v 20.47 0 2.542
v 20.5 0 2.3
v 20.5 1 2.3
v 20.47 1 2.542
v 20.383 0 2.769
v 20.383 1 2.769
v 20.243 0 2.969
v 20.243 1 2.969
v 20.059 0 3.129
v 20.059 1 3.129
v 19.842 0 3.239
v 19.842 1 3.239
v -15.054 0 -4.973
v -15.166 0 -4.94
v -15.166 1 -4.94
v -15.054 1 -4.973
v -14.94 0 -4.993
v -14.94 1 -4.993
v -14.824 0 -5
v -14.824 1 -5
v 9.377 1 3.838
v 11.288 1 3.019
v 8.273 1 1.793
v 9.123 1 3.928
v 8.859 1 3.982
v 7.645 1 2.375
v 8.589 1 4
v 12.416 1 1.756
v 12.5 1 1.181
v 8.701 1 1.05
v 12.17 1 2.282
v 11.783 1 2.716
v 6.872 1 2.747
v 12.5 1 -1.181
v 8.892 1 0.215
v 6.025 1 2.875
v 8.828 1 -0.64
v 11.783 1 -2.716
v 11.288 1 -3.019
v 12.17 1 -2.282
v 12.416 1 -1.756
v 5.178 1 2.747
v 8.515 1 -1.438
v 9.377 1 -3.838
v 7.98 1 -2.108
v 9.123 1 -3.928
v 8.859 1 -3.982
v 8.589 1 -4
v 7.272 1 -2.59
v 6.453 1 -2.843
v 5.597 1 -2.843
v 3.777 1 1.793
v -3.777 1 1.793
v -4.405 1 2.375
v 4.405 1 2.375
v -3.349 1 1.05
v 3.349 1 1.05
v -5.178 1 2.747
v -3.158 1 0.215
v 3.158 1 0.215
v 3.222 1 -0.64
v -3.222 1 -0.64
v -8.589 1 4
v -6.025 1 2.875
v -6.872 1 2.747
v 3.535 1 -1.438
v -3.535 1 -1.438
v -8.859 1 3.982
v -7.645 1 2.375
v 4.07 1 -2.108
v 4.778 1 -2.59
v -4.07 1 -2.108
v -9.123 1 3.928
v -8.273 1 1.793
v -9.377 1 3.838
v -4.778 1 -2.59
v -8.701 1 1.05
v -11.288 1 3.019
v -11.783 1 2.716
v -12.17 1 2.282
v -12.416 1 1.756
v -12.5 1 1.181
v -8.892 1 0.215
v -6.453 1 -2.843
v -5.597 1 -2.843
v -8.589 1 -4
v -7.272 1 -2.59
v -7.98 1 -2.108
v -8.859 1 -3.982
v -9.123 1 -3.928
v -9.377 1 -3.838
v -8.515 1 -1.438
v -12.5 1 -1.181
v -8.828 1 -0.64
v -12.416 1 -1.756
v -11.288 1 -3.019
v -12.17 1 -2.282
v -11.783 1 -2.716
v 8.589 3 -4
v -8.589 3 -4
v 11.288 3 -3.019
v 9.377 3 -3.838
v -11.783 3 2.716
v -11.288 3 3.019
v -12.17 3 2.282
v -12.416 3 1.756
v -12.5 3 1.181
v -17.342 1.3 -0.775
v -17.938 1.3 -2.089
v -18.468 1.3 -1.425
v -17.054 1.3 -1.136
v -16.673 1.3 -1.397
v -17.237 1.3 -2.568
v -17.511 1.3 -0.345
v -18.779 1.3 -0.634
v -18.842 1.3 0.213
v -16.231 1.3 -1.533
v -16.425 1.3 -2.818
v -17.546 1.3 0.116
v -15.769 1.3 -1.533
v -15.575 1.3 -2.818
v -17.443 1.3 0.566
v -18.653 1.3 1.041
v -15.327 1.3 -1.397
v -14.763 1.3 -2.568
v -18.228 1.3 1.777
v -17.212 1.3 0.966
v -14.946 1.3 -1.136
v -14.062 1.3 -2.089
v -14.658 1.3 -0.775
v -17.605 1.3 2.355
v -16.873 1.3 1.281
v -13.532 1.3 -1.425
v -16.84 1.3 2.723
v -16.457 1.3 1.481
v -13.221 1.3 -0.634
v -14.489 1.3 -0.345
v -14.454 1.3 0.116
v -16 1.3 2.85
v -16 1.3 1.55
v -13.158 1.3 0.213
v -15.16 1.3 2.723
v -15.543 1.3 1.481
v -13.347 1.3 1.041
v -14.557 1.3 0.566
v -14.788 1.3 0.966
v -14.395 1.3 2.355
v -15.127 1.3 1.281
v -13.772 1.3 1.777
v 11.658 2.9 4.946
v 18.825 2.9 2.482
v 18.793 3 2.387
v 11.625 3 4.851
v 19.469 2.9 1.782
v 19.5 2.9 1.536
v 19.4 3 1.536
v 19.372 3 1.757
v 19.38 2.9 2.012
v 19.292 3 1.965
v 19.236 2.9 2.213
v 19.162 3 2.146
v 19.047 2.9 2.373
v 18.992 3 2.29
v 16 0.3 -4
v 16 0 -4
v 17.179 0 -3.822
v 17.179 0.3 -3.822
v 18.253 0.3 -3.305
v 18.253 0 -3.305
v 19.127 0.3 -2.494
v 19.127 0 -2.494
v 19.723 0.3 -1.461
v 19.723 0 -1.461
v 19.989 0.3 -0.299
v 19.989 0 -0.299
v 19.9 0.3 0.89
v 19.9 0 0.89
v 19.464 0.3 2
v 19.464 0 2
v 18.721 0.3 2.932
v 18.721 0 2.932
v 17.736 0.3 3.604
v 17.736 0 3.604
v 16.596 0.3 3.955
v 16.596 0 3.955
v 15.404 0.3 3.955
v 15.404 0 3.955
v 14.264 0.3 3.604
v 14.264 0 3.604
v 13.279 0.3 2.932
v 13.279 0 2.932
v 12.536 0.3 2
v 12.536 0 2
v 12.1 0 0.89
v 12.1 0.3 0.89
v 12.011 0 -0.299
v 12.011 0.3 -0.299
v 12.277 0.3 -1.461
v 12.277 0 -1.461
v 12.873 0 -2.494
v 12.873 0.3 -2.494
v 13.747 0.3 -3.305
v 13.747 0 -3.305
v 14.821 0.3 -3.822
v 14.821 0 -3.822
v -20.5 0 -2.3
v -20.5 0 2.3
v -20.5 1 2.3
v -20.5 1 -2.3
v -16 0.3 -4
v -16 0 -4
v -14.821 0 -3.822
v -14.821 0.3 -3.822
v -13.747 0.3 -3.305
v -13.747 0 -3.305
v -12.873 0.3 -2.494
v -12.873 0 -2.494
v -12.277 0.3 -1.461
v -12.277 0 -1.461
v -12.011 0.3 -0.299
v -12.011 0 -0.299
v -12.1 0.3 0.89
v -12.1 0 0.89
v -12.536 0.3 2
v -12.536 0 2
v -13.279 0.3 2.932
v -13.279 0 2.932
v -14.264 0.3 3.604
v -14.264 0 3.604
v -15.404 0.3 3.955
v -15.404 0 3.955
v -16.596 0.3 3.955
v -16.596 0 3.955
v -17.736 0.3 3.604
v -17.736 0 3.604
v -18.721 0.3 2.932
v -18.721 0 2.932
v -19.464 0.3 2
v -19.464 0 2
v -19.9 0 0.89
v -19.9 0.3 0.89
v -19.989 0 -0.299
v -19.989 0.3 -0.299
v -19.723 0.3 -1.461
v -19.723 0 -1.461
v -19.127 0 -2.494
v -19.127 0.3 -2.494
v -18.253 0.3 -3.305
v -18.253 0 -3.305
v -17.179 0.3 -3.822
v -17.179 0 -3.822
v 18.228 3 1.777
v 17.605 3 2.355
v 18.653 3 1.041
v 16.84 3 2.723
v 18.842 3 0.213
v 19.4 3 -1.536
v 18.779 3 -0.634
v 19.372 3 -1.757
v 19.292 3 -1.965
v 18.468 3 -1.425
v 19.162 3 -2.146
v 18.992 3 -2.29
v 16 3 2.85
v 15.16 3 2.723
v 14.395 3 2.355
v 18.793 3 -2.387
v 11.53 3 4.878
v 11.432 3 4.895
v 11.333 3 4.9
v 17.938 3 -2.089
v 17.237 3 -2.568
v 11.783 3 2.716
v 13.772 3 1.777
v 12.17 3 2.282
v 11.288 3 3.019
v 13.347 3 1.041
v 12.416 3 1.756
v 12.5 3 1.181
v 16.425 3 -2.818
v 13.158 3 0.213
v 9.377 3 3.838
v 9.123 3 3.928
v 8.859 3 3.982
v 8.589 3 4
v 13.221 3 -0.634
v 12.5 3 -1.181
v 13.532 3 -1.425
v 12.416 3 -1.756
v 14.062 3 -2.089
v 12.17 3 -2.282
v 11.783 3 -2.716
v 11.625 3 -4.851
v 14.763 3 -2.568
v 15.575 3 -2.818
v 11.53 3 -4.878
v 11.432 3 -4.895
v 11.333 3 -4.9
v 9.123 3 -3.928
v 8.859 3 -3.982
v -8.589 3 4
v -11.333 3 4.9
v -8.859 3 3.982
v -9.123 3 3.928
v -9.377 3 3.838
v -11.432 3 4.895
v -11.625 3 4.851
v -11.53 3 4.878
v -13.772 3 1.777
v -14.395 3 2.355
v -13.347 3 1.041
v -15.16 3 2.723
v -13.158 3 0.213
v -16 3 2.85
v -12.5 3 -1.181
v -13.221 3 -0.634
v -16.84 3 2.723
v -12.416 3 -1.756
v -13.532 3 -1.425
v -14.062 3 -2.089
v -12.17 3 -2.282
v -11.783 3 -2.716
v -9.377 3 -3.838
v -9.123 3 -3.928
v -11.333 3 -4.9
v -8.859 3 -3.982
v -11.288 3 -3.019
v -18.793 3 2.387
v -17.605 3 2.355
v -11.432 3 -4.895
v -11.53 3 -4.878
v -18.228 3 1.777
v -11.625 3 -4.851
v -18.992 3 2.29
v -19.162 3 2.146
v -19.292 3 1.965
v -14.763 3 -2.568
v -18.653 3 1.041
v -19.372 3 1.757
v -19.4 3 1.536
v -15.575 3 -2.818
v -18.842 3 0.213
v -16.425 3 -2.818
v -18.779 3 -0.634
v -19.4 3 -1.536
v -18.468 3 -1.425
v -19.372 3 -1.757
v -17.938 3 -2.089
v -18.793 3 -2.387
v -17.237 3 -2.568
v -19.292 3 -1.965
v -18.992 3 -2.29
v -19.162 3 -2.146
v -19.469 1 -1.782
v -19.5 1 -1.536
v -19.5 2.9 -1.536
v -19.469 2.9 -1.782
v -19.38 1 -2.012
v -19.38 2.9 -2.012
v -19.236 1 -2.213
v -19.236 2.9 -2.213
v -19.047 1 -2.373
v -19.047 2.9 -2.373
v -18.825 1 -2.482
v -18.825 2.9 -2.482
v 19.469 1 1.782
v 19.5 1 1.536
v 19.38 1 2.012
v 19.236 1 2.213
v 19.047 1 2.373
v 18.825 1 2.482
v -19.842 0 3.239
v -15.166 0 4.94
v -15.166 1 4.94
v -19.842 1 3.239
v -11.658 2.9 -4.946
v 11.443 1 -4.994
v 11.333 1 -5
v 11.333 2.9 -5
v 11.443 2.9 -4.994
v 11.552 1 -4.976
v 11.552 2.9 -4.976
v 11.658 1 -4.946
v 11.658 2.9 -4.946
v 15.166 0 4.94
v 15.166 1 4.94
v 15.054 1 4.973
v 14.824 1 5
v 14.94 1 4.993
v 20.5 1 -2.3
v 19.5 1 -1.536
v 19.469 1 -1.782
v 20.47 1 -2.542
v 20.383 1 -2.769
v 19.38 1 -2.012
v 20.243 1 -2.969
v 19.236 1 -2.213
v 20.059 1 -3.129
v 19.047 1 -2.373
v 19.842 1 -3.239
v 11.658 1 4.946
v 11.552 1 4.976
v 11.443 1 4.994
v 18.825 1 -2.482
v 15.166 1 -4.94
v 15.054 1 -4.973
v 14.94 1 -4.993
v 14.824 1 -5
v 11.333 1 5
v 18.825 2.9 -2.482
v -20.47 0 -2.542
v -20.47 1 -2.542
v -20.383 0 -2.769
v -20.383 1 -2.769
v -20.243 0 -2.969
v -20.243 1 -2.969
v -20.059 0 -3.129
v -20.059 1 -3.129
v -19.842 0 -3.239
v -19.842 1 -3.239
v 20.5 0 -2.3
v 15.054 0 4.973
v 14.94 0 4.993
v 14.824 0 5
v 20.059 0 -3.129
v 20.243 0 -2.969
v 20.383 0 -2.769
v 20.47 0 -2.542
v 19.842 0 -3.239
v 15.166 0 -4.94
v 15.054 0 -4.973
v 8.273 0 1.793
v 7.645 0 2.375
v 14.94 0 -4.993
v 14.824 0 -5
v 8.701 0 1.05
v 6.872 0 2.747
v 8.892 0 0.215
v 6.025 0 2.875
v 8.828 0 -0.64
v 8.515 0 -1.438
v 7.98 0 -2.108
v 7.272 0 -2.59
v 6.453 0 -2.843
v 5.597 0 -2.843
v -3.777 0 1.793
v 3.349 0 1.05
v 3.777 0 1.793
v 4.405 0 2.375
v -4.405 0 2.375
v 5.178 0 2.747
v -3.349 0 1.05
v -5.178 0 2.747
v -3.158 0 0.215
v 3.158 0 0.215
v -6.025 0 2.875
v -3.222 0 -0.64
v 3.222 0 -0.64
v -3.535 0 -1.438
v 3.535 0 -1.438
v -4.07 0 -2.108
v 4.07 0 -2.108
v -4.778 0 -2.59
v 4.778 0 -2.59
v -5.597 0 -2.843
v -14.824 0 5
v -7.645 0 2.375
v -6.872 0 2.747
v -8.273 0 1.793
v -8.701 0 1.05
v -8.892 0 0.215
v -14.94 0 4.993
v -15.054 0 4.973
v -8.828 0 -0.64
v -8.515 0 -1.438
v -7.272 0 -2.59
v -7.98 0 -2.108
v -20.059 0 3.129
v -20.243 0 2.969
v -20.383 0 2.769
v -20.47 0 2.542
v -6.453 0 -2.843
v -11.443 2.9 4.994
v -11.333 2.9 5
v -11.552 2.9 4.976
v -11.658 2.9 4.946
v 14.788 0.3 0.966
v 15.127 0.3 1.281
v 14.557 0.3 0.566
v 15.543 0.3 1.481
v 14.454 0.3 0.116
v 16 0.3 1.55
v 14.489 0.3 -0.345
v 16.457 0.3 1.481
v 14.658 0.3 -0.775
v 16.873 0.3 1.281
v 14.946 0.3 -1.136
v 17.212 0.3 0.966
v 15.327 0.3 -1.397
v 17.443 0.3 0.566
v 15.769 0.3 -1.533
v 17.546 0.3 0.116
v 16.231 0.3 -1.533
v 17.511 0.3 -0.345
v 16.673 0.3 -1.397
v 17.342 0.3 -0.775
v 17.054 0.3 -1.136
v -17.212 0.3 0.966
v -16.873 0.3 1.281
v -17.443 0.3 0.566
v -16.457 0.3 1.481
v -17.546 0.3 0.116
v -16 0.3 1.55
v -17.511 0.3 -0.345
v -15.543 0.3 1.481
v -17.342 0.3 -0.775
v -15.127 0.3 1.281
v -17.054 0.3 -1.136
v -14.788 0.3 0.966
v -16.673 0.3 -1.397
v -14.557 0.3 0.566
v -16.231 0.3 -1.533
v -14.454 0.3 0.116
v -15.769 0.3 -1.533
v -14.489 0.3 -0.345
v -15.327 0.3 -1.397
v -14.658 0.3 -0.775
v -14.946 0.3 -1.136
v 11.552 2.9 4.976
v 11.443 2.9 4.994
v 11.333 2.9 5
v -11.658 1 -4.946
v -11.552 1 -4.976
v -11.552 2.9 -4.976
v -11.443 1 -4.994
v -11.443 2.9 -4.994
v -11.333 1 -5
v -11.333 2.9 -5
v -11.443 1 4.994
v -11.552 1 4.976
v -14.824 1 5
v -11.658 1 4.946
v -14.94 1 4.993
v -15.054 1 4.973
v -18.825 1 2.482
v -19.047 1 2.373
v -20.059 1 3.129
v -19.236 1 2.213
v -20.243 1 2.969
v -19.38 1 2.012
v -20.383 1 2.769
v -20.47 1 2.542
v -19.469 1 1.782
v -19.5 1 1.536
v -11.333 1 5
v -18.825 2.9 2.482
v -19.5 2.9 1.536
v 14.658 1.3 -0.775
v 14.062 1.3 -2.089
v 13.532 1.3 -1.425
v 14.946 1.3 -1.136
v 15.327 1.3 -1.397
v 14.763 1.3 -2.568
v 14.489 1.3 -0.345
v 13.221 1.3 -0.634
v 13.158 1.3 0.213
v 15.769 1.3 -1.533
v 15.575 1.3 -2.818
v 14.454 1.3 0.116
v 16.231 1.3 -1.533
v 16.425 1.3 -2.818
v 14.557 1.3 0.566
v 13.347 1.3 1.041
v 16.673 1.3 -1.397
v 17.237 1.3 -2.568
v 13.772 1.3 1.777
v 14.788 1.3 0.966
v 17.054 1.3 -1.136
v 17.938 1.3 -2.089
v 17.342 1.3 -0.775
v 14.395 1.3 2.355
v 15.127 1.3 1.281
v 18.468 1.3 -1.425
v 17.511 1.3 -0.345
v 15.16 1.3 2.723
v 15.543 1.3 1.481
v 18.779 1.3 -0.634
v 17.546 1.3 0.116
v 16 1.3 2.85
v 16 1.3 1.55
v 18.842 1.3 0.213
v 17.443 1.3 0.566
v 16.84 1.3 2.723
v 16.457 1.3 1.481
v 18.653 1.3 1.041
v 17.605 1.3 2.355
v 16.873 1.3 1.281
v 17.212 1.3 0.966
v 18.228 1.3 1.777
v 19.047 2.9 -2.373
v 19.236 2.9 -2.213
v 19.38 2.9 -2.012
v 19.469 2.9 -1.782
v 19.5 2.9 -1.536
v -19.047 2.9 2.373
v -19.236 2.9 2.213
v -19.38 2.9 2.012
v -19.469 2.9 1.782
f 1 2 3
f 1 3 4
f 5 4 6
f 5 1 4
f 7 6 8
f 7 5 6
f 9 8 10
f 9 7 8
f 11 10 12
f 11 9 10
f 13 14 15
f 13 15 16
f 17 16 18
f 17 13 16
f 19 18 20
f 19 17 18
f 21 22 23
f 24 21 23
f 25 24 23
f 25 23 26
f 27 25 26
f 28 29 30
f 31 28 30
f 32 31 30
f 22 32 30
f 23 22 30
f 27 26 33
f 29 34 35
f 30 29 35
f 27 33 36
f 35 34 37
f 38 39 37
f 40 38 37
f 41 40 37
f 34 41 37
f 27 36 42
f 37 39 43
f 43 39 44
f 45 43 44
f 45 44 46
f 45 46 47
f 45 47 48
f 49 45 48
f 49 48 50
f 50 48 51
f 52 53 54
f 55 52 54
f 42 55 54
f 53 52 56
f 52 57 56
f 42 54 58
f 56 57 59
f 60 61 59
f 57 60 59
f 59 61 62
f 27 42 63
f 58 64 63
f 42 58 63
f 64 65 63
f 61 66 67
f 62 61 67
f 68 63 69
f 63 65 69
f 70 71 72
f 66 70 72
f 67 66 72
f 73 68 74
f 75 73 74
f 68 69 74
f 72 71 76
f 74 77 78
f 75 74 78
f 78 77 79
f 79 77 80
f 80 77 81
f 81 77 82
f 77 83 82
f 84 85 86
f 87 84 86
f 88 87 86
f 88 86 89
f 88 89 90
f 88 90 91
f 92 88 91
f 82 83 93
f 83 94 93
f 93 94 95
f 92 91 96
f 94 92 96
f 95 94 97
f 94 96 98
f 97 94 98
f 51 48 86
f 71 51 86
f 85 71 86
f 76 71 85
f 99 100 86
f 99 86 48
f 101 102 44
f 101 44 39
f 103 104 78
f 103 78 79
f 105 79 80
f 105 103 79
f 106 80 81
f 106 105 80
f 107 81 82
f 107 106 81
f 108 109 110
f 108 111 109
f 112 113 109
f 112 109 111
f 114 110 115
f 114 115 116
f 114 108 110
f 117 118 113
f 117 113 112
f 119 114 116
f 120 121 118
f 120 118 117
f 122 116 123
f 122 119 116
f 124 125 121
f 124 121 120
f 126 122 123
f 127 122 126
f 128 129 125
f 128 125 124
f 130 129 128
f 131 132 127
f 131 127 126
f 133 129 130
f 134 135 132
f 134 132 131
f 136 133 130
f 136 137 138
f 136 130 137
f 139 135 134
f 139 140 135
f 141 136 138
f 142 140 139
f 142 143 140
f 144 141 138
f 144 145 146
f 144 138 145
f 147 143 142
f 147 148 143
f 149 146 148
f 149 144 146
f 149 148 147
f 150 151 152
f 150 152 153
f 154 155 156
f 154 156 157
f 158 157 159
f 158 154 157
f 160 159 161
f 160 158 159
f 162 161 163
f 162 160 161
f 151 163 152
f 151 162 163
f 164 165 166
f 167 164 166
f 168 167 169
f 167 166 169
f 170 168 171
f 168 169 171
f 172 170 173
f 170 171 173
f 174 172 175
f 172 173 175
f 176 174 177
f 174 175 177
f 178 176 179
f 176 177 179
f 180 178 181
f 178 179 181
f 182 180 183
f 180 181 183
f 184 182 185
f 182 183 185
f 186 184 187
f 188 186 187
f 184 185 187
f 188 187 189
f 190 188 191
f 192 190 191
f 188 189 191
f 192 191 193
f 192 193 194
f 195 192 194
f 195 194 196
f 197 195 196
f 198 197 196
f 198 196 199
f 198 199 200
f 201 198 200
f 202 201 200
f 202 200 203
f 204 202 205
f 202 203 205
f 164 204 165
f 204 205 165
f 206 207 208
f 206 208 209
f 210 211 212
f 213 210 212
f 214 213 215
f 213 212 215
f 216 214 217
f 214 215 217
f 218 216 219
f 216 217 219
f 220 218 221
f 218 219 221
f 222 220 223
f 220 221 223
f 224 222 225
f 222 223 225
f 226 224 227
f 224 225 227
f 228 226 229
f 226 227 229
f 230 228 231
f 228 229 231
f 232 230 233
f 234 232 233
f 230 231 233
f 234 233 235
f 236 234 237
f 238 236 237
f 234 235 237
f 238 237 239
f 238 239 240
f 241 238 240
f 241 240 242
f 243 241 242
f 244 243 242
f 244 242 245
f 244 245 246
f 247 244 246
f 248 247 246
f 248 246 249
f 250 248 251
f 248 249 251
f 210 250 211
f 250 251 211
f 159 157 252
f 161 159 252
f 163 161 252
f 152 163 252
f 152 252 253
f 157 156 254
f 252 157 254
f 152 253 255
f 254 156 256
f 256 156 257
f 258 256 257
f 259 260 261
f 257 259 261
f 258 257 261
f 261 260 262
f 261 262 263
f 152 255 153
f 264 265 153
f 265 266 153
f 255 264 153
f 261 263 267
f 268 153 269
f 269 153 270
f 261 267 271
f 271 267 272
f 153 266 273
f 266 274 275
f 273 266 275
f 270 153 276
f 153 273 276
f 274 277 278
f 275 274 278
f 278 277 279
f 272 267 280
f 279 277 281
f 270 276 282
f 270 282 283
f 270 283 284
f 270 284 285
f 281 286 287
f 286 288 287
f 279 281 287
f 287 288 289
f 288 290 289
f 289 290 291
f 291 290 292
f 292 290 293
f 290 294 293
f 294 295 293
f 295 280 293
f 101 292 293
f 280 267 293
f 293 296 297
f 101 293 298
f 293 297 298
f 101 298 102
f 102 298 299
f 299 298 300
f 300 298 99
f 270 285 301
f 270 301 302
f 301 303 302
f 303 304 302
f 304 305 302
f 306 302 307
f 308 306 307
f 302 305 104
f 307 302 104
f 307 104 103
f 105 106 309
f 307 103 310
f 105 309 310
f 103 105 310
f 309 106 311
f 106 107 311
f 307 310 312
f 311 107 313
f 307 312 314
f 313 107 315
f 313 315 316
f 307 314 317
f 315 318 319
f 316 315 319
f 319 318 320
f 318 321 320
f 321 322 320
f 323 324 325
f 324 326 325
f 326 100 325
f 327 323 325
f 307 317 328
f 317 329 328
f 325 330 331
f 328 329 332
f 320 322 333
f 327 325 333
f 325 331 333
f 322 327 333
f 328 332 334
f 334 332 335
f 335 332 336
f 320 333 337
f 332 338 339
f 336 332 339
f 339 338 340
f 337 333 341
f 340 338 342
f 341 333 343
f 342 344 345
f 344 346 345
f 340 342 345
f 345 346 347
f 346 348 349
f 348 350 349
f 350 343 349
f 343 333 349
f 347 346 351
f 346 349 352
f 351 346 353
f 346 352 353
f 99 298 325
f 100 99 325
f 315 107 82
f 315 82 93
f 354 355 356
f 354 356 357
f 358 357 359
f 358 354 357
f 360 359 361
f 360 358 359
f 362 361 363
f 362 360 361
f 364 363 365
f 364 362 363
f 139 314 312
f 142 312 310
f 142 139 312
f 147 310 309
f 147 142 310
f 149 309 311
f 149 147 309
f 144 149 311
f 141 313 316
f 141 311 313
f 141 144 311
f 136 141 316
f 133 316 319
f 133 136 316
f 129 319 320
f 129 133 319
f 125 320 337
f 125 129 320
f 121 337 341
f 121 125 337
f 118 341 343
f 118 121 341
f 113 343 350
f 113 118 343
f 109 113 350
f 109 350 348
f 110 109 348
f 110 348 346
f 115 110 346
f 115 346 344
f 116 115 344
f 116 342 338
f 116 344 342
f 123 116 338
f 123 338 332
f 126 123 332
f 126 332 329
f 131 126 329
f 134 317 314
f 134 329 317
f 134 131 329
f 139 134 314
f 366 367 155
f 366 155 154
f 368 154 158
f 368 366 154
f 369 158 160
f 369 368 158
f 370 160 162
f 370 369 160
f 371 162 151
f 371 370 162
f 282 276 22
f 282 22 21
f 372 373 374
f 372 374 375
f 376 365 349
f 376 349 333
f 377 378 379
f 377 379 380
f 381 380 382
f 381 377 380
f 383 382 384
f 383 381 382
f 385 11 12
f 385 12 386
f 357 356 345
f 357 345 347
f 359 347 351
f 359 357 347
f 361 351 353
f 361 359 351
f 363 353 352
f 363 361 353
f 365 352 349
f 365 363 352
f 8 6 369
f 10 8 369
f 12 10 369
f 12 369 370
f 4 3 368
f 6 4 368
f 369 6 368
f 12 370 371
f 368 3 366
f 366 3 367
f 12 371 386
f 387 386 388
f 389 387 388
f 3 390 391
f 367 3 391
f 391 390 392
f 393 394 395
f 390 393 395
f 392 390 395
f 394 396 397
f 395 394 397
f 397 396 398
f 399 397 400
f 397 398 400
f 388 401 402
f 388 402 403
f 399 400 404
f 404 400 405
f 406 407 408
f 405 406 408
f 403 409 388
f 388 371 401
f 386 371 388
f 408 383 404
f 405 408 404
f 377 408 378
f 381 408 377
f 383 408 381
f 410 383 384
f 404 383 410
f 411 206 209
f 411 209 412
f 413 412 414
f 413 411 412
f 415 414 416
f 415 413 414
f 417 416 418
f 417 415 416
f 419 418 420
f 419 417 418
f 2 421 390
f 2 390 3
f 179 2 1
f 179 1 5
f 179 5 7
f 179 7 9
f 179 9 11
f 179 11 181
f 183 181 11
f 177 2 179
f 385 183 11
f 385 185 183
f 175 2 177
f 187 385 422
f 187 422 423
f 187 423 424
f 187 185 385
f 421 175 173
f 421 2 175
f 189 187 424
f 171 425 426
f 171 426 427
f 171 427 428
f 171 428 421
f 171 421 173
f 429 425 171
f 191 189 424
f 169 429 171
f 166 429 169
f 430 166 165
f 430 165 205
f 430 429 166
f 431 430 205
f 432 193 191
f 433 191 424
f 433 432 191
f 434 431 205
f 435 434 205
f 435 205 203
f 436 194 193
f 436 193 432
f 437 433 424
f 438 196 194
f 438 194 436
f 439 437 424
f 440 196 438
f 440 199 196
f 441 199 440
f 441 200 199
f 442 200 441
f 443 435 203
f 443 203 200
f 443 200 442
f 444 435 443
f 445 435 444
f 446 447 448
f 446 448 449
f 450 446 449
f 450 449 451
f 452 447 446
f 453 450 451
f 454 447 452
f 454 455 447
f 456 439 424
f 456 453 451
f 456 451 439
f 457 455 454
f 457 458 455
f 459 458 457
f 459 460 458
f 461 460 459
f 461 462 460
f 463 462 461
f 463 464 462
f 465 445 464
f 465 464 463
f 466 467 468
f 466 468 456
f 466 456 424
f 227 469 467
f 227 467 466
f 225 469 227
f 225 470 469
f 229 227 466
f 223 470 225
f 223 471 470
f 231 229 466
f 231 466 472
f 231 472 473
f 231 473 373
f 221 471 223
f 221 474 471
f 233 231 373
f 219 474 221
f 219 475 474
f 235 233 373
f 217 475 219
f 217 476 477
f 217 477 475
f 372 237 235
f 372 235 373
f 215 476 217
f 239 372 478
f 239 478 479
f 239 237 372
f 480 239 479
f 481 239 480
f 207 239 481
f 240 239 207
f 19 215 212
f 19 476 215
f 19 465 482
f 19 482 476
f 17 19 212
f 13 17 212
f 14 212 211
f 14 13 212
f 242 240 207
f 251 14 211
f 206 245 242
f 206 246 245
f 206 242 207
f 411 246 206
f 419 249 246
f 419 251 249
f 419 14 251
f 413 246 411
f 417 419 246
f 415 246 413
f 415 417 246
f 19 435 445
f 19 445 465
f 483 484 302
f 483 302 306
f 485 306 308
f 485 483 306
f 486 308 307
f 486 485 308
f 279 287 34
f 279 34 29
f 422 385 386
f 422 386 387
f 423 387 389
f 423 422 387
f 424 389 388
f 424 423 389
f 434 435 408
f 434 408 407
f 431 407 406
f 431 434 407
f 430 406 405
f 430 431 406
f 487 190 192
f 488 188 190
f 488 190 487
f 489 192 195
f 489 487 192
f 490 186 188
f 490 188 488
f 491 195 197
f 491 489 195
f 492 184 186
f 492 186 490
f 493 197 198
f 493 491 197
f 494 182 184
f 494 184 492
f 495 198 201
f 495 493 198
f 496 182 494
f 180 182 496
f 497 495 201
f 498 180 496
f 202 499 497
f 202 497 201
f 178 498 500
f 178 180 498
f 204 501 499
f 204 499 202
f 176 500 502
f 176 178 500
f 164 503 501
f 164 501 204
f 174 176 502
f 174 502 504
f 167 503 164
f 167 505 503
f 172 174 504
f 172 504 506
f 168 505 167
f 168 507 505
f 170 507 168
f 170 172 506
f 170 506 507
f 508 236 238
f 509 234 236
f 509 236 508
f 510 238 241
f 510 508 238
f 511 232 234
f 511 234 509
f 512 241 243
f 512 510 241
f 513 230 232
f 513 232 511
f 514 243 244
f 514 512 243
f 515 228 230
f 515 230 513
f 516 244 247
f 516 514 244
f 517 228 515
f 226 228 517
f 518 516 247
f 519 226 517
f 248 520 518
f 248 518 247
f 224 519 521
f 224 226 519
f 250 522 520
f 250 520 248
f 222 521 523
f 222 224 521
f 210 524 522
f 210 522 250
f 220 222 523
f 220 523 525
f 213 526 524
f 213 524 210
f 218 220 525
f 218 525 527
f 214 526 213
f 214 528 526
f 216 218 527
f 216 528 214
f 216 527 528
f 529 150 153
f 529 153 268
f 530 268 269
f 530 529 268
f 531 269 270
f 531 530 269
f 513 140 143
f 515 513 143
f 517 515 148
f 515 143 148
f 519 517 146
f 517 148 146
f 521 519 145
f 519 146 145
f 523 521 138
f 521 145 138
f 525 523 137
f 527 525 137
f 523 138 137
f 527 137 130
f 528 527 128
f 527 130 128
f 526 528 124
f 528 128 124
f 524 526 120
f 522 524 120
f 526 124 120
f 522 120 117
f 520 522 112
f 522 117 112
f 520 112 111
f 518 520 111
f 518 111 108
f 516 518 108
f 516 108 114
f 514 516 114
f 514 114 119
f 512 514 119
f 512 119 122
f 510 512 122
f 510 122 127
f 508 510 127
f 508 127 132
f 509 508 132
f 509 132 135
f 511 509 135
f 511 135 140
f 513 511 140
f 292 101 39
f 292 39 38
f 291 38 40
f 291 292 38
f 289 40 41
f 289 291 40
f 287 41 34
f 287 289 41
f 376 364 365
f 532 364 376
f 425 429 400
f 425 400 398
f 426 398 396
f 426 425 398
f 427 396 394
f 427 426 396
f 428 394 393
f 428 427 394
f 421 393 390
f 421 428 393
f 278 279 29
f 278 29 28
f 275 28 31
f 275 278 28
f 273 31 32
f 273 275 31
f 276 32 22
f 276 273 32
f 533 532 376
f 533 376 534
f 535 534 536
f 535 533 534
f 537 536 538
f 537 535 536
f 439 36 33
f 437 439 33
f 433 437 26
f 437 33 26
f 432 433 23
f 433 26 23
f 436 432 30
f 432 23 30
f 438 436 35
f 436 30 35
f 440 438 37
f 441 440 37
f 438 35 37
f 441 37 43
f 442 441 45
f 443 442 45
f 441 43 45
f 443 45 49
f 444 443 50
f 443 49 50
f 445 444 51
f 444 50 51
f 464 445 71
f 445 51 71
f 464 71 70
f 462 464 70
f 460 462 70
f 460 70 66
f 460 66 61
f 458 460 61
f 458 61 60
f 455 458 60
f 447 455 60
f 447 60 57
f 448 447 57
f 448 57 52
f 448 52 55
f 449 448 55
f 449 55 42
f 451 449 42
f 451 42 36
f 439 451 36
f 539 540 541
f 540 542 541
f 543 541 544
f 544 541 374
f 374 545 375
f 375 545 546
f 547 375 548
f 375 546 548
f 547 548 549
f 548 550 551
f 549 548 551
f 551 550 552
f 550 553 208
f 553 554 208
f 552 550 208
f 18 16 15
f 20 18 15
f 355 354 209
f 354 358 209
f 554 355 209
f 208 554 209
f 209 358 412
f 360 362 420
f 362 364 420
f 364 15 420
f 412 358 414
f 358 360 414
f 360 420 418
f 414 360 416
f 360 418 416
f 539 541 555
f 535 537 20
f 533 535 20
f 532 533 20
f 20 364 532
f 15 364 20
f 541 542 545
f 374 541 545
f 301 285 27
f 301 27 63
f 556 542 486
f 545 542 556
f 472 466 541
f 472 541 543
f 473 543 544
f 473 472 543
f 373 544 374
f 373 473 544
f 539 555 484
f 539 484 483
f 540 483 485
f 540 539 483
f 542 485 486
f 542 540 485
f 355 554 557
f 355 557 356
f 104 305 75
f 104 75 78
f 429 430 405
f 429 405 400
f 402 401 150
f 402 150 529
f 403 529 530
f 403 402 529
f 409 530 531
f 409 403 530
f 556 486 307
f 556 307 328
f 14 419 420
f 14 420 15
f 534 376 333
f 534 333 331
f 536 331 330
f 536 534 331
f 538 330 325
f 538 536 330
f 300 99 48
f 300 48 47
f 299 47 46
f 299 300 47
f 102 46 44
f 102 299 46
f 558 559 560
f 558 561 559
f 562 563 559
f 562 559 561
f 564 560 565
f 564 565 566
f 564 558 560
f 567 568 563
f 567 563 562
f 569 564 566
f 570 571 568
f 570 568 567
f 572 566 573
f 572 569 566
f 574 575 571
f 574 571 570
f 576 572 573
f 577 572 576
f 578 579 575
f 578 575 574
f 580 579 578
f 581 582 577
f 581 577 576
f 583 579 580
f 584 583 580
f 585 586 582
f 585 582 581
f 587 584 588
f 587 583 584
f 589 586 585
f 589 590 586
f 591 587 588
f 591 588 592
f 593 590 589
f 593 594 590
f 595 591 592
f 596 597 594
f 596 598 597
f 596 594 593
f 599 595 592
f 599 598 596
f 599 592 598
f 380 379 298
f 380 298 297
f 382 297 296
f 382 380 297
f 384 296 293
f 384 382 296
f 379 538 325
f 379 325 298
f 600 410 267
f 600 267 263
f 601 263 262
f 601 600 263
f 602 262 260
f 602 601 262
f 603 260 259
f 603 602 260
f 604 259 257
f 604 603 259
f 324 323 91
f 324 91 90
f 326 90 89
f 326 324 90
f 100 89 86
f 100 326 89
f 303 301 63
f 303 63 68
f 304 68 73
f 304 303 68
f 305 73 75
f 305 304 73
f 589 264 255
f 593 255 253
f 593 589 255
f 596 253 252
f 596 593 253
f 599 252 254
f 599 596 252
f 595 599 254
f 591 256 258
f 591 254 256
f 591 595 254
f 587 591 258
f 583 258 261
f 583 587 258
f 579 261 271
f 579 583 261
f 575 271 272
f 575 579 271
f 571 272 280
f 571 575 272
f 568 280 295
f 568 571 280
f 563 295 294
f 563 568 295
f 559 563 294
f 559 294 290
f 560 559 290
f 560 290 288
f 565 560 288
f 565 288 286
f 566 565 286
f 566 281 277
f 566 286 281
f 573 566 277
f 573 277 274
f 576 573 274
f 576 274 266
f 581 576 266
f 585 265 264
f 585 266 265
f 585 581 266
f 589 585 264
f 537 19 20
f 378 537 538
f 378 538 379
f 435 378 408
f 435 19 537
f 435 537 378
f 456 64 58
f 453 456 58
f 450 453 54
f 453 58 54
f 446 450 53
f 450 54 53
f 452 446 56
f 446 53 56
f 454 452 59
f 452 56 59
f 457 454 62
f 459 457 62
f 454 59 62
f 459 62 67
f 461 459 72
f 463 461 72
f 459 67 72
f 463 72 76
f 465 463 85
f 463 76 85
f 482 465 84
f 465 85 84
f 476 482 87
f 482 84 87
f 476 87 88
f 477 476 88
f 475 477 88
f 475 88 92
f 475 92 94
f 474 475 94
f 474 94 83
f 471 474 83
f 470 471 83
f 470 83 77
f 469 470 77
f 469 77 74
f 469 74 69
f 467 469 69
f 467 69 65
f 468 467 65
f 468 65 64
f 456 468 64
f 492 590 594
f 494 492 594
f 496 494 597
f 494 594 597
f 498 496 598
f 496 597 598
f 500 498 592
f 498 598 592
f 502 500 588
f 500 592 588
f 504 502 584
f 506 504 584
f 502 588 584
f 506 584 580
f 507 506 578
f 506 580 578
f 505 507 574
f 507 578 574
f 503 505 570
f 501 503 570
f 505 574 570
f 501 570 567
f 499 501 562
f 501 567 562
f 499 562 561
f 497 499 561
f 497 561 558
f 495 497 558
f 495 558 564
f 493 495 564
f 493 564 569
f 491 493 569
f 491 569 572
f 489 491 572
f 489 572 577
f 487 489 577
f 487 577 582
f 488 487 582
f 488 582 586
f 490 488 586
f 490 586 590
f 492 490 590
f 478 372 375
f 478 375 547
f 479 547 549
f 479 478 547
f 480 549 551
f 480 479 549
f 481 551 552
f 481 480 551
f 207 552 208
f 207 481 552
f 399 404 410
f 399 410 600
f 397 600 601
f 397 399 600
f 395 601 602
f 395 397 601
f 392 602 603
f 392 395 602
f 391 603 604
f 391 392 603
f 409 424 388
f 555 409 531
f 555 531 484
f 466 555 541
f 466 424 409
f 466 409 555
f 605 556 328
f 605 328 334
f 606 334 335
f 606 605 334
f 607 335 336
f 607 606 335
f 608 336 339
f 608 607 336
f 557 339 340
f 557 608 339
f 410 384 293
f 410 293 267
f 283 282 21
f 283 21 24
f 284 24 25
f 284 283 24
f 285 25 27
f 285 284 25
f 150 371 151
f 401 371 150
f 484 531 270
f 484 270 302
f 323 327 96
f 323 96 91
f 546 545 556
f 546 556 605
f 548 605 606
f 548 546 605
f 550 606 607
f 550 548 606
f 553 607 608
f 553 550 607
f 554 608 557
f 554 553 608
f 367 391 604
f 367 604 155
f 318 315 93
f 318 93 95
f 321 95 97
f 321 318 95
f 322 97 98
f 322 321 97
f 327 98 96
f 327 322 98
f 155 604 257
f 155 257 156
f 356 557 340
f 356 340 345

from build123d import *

# Parameters (mm, degrees)
BOSS_EXTRUDE1_DEPTH     = 1
BOSS_EXTRUDE2_DEPTH     = 2
SKETCH3_R               = 1.55
CUT_EXTRUDE1_DEPTH      = 22.313141486
CUT_EXTRUDE2_DEPTH      = 2
CUT_EXTRUDE2_DEPTH_BACK = 1.7
SKETCH4_R               = 2.85
CUT_EXTRUDE3_DEPTH      = 2
SKETCH6_R               = 2.875
CUT_EXTRUDE4_DEPTH      = 22.195518394
CHAMFER1_SIZE           = 0.1
SKETCH7_R               = 4
CUT_EXTRUDE5_DEPTH      = 0.3


with BuildPart() as part:
    # Sketch1 → Boss-Extrude1 (new body)
    with BuildSketch(Plane(origin=(0, 0, 0), x_dir=(1, 0, 0), z_dir=(0, 1, 0))):
        with BuildLine():
            Line((14.823825022, -5), (-14.823825022, -5))
            ThreePointArc((-14.823825022, -5), (-14.997328014, -4.984833342), (-15.165568085, -4.939793423))
            Line((-15.165568085, -4.939793423), (-19.841743063, -3.239366159))
            ThreePointArc((-19.841743063, -3.239366159), (-20.319067477, -2.873269928), (-20.5, -2.299572735))
            Line((-20.5, -2.299572735), (-20.5, 2.299572735))
            ThreePointArc((-20.5, 2.299572735), (-20.319067477, 2.873269928), (-19.841743063, 3.239366159))
            Line((-19.841743063, 3.239366159), (-15.165568085, 4.939793423))
            ThreePointArc((-15.165568085, 4.939793423), (-14.997328014, 4.984833342), (-14.823825022, 5))
            Line((-14.823825022, 5), (14.823825022, 5))
            ThreePointArc((14.823825022, 5), (14.997328014, 4.984833342), (15.165568085, 4.939793423))
            Line((15.165568085, 4.939793423), (19.841743063, 3.239366159))
            ThreePointArc((19.841743063, 3.239366159), (20.319067477, 2.873269928), (20.5, 2.299572735))
            Line((20.5, 2.299572735), (20.5, -2.299572735))
            ThreePointArc((20.5, -2.299572735), (20.319067477, -2.873269928), (19.841743063, -3.239366159))
            Line((19.841743063, -3.239366159), (15.165568085, -4.939793423))
            ThreePointArc((15.165568085, -4.939793423), (14.997328014, -4.984833342), (14.823825022, -5))
        make_face()
    extrude(amount=BOSS_EXTRUDE1_DEPTH)

    # Sketch2 → Boss-Extrude2 (add)
    with BuildSketch(Plane(origin=(0, 1, 0), x_dir=(1, 0, 0), z_dir=(0, 1, 0))):
        with BuildLine():
            Line((11.332922852, -5), (-11.332922852, -5))
            ThreePointArc((-11.332922852, -5), (-11.497715753, -4.986328191), (-11.65800262, -4.945686599))
            Line((-11.65800262, -4.945686599), (-18.825079769, -2.48200383))
            ThreePointArc((-18.825079769, -2.48200383), (-19.31396553, -2.117230404), (-19.5, -1.53631723))
            Line((-19.5, -1.53631723), (-19.5, 1.53631723))
            ThreePointArc((-19.5, 1.53631723), (-19.31396553, 2.117230404), (-18.825079769, 2.48200383))
            Line((-18.825079769, 2.48200383), (-11.65800262, 4.945686599))
            ThreePointArc((-11.65800262, 4.945686599), (-11.497715753, 4.986328191), (-11.332922852, 5))
            Line((-11.332922852, 5), (11.332922852, 5))
            ThreePointArc((11.332922852, 5), (11.497715753, 4.986328191), (11.65800262, 4.945686599))
            Line((11.65800262, 4.945686599), (18.825079769, 2.48200383))
            ThreePointArc((18.825079769, 2.48200383), (19.31396553, 2.117230404), (19.5, 1.53631723))
            Line((19.5, 1.53631723), (19.5, -1.53631723))
            ThreePointArc((19.5, -1.53631723), (19.31396553, -2.117230404), (18.825079769, -2.48200383))
            Line((18.825079769, -2.48200383), (11.65800262, -4.945686599))
            ThreePointArc((11.65800262, -4.945686599), (11.497715753, -4.986328191), (11.332922852, -5))
        make_face()
    extrude(amount=BOSS_EXTRUDE2_DEPTH)

    # Sketch3 → Cut-Extrude1 (cut, through all)
    with BuildSketch(Plane(origin=(0, 3, 0), x_dir=(1, 0, 0), z_dir=(0, 1, 0))):
        with Locations(Location((-16, 0, 0), (0, 0, 270))):
            Circle(SKETCH3_R)
        with Locations(Location((16, 0, 0), (0, 0, 270))):
            Circle(SKETCH3_R)
    extrude(amount=-CUT_EXTRUDE1_DEPTH, mode=Mode.SUBTRACT)

    # Sketch4 → Cut-Extrude2 (cut, two sides: drawn at the far end of the back side and taken through both)
    with BuildSketch(Plane(origin=(0, 3, 0), x_dir=(1, 0, 0), z_dir=(0, 1, 0)).offset(-CUT_EXTRUDE2_DEPTH_BACK)):
        with Locations(Location((-16, 0, 0), (0, 0, 270))):
            Circle(SKETCH4_R)
        with Locations(Location((16, 0, 0), (0, 0, 270))):
            Circle(SKETCH4_R)
    extrude(amount=CUT_EXTRUDE2_DEPTH + CUT_EXTRUDE2_DEPTH_BACK, mode=Mode.SUBTRACT)

    # Sketch5 → Cut-Extrude3 (cut)
    with BuildSketch(Plane(origin=(0, 3, 0), x_dir=(1, 0, 0), z_dir=(0, 1, 0))):
        with BuildLine():
            Line((8.589484596, -4), (-8.589484596, -4))
            ThreePointArc((-8.589484596, -4), (-8.991616341, -3.959155446), (-9.377323193, -3.83829006))
            Line((-9.377323193, -3.83829006), (-11.287838597, -3.019497744))
            ThreePointArc((-11.287838597, -3.019497744), (-12.169682184, -2.282189702), (-12.5, -1.181207684))
            Line((-12.5, -1.181207684), (-12.5, 1.181207684))
            ThreePointArc((-12.5, 1.181207684), (-12.169682184, 2.282189702), (-11.287838597, 3.019497744))
            Line((-11.287838597, 3.019497744), (-9.377323193, 3.83829006))
            ThreePointArc((-9.377323193, 3.83829006), (-8.991616341, 3.959155446), (-8.589484596, 4))
            Line((-8.589484596, 4), (8.589484596, 4))
            ThreePointArc((8.589484596, 4), (8.991616341, 3.959155446), (9.377323193, 3.83829006))
            Line((9.377323193, 3.83829006), (11.287838597, 3.019497744))
            ThreePointArc((11.287838597, 3.019497744), (12.169682184, 2.282189702), (12.5, 1.181207684))
            Line((12.5, 1.181207684), (12.5, -1.181207684))
            ThreePointArc((12.5, -1.181207684), (12.169682184, -2.282189702), (11.287838597, -3.019497744))
            Line((11.287838597, -3.019497744), (9.377323193, -3.83829006))
            ThreePointArc((9.377323193, -3.83829006), (8.991616341, -3.959155446), (8.589484596, -4))
        make_face()
    extrude(amount=-CUT_EXTRUDE3_DEPTH, mode=Mode.SUBTRACT)

    # Sketch6 → Cut-Extrude4 (cut, through all)
    with BuildSketch(Plane(origin=(0, 1, 0), x_dir=(1, 0, 0), z_dir=(0, 1, 0))):
        with Locations(Location((-6.025, 0, 0), (0, 0, 270))):
            Circle(SKETCH6_R)
        with Locations(Location((6.025, 0, 0), (0, 0, 270))):
            Circle(SKETCH6_R)
    extrude(amount=-CUT_EXTRUDE4_DEPTH, mode=Mode.SUBTRACT)

    # Chamfer1
    chamfer1_edges = [part.edges().sort_by_distance(p)[0] for p in [
        (-19.31396553, 3, -2.117230404),
        (-19.5, 3, 0),
        (-19.31396553, 3, 2.117230404),
        (-15.241541194, 3, 3.713845214),
        (-11.497715753, 3, 4.986328191),
        (0, 3, 5),
        (11.497715753, 3, 4.986328191),
        (15.241541194, 3, 3.713845214),
        (19.31396553, 3, 2.117230404),
        (19.5, 3, 0),
        (19.31396553, 3, -2.117230404),
        (15.241541194, 3, -3.713845214),
        (11.497715753, 3, -4.986328191),
        (0, 3, -5),
        (-11.497715753, 3, -4.986328191),
        (-15.241541194, 3, -3.713845214),
    ]]
    chamfer(chamfer1_edges, length=CHAMFER1_SIZE)

    # Sketch7 → Cut-Extrude5 (cut)
    with BuildSketch(Plane.XZ):
        with Locations(Location((-16, 0, 0), (0, 0, 270))):
            Circle(SKETCH7_R)
        with Locations(Location((16, 0, 0), (0, 0, 270))):
            Circle(SKETCH7_R)
    extrude(amount=-CUT_EXTRUDE5_DEPTH, mode=Mode.SUBTRACT)


solid = part.part
